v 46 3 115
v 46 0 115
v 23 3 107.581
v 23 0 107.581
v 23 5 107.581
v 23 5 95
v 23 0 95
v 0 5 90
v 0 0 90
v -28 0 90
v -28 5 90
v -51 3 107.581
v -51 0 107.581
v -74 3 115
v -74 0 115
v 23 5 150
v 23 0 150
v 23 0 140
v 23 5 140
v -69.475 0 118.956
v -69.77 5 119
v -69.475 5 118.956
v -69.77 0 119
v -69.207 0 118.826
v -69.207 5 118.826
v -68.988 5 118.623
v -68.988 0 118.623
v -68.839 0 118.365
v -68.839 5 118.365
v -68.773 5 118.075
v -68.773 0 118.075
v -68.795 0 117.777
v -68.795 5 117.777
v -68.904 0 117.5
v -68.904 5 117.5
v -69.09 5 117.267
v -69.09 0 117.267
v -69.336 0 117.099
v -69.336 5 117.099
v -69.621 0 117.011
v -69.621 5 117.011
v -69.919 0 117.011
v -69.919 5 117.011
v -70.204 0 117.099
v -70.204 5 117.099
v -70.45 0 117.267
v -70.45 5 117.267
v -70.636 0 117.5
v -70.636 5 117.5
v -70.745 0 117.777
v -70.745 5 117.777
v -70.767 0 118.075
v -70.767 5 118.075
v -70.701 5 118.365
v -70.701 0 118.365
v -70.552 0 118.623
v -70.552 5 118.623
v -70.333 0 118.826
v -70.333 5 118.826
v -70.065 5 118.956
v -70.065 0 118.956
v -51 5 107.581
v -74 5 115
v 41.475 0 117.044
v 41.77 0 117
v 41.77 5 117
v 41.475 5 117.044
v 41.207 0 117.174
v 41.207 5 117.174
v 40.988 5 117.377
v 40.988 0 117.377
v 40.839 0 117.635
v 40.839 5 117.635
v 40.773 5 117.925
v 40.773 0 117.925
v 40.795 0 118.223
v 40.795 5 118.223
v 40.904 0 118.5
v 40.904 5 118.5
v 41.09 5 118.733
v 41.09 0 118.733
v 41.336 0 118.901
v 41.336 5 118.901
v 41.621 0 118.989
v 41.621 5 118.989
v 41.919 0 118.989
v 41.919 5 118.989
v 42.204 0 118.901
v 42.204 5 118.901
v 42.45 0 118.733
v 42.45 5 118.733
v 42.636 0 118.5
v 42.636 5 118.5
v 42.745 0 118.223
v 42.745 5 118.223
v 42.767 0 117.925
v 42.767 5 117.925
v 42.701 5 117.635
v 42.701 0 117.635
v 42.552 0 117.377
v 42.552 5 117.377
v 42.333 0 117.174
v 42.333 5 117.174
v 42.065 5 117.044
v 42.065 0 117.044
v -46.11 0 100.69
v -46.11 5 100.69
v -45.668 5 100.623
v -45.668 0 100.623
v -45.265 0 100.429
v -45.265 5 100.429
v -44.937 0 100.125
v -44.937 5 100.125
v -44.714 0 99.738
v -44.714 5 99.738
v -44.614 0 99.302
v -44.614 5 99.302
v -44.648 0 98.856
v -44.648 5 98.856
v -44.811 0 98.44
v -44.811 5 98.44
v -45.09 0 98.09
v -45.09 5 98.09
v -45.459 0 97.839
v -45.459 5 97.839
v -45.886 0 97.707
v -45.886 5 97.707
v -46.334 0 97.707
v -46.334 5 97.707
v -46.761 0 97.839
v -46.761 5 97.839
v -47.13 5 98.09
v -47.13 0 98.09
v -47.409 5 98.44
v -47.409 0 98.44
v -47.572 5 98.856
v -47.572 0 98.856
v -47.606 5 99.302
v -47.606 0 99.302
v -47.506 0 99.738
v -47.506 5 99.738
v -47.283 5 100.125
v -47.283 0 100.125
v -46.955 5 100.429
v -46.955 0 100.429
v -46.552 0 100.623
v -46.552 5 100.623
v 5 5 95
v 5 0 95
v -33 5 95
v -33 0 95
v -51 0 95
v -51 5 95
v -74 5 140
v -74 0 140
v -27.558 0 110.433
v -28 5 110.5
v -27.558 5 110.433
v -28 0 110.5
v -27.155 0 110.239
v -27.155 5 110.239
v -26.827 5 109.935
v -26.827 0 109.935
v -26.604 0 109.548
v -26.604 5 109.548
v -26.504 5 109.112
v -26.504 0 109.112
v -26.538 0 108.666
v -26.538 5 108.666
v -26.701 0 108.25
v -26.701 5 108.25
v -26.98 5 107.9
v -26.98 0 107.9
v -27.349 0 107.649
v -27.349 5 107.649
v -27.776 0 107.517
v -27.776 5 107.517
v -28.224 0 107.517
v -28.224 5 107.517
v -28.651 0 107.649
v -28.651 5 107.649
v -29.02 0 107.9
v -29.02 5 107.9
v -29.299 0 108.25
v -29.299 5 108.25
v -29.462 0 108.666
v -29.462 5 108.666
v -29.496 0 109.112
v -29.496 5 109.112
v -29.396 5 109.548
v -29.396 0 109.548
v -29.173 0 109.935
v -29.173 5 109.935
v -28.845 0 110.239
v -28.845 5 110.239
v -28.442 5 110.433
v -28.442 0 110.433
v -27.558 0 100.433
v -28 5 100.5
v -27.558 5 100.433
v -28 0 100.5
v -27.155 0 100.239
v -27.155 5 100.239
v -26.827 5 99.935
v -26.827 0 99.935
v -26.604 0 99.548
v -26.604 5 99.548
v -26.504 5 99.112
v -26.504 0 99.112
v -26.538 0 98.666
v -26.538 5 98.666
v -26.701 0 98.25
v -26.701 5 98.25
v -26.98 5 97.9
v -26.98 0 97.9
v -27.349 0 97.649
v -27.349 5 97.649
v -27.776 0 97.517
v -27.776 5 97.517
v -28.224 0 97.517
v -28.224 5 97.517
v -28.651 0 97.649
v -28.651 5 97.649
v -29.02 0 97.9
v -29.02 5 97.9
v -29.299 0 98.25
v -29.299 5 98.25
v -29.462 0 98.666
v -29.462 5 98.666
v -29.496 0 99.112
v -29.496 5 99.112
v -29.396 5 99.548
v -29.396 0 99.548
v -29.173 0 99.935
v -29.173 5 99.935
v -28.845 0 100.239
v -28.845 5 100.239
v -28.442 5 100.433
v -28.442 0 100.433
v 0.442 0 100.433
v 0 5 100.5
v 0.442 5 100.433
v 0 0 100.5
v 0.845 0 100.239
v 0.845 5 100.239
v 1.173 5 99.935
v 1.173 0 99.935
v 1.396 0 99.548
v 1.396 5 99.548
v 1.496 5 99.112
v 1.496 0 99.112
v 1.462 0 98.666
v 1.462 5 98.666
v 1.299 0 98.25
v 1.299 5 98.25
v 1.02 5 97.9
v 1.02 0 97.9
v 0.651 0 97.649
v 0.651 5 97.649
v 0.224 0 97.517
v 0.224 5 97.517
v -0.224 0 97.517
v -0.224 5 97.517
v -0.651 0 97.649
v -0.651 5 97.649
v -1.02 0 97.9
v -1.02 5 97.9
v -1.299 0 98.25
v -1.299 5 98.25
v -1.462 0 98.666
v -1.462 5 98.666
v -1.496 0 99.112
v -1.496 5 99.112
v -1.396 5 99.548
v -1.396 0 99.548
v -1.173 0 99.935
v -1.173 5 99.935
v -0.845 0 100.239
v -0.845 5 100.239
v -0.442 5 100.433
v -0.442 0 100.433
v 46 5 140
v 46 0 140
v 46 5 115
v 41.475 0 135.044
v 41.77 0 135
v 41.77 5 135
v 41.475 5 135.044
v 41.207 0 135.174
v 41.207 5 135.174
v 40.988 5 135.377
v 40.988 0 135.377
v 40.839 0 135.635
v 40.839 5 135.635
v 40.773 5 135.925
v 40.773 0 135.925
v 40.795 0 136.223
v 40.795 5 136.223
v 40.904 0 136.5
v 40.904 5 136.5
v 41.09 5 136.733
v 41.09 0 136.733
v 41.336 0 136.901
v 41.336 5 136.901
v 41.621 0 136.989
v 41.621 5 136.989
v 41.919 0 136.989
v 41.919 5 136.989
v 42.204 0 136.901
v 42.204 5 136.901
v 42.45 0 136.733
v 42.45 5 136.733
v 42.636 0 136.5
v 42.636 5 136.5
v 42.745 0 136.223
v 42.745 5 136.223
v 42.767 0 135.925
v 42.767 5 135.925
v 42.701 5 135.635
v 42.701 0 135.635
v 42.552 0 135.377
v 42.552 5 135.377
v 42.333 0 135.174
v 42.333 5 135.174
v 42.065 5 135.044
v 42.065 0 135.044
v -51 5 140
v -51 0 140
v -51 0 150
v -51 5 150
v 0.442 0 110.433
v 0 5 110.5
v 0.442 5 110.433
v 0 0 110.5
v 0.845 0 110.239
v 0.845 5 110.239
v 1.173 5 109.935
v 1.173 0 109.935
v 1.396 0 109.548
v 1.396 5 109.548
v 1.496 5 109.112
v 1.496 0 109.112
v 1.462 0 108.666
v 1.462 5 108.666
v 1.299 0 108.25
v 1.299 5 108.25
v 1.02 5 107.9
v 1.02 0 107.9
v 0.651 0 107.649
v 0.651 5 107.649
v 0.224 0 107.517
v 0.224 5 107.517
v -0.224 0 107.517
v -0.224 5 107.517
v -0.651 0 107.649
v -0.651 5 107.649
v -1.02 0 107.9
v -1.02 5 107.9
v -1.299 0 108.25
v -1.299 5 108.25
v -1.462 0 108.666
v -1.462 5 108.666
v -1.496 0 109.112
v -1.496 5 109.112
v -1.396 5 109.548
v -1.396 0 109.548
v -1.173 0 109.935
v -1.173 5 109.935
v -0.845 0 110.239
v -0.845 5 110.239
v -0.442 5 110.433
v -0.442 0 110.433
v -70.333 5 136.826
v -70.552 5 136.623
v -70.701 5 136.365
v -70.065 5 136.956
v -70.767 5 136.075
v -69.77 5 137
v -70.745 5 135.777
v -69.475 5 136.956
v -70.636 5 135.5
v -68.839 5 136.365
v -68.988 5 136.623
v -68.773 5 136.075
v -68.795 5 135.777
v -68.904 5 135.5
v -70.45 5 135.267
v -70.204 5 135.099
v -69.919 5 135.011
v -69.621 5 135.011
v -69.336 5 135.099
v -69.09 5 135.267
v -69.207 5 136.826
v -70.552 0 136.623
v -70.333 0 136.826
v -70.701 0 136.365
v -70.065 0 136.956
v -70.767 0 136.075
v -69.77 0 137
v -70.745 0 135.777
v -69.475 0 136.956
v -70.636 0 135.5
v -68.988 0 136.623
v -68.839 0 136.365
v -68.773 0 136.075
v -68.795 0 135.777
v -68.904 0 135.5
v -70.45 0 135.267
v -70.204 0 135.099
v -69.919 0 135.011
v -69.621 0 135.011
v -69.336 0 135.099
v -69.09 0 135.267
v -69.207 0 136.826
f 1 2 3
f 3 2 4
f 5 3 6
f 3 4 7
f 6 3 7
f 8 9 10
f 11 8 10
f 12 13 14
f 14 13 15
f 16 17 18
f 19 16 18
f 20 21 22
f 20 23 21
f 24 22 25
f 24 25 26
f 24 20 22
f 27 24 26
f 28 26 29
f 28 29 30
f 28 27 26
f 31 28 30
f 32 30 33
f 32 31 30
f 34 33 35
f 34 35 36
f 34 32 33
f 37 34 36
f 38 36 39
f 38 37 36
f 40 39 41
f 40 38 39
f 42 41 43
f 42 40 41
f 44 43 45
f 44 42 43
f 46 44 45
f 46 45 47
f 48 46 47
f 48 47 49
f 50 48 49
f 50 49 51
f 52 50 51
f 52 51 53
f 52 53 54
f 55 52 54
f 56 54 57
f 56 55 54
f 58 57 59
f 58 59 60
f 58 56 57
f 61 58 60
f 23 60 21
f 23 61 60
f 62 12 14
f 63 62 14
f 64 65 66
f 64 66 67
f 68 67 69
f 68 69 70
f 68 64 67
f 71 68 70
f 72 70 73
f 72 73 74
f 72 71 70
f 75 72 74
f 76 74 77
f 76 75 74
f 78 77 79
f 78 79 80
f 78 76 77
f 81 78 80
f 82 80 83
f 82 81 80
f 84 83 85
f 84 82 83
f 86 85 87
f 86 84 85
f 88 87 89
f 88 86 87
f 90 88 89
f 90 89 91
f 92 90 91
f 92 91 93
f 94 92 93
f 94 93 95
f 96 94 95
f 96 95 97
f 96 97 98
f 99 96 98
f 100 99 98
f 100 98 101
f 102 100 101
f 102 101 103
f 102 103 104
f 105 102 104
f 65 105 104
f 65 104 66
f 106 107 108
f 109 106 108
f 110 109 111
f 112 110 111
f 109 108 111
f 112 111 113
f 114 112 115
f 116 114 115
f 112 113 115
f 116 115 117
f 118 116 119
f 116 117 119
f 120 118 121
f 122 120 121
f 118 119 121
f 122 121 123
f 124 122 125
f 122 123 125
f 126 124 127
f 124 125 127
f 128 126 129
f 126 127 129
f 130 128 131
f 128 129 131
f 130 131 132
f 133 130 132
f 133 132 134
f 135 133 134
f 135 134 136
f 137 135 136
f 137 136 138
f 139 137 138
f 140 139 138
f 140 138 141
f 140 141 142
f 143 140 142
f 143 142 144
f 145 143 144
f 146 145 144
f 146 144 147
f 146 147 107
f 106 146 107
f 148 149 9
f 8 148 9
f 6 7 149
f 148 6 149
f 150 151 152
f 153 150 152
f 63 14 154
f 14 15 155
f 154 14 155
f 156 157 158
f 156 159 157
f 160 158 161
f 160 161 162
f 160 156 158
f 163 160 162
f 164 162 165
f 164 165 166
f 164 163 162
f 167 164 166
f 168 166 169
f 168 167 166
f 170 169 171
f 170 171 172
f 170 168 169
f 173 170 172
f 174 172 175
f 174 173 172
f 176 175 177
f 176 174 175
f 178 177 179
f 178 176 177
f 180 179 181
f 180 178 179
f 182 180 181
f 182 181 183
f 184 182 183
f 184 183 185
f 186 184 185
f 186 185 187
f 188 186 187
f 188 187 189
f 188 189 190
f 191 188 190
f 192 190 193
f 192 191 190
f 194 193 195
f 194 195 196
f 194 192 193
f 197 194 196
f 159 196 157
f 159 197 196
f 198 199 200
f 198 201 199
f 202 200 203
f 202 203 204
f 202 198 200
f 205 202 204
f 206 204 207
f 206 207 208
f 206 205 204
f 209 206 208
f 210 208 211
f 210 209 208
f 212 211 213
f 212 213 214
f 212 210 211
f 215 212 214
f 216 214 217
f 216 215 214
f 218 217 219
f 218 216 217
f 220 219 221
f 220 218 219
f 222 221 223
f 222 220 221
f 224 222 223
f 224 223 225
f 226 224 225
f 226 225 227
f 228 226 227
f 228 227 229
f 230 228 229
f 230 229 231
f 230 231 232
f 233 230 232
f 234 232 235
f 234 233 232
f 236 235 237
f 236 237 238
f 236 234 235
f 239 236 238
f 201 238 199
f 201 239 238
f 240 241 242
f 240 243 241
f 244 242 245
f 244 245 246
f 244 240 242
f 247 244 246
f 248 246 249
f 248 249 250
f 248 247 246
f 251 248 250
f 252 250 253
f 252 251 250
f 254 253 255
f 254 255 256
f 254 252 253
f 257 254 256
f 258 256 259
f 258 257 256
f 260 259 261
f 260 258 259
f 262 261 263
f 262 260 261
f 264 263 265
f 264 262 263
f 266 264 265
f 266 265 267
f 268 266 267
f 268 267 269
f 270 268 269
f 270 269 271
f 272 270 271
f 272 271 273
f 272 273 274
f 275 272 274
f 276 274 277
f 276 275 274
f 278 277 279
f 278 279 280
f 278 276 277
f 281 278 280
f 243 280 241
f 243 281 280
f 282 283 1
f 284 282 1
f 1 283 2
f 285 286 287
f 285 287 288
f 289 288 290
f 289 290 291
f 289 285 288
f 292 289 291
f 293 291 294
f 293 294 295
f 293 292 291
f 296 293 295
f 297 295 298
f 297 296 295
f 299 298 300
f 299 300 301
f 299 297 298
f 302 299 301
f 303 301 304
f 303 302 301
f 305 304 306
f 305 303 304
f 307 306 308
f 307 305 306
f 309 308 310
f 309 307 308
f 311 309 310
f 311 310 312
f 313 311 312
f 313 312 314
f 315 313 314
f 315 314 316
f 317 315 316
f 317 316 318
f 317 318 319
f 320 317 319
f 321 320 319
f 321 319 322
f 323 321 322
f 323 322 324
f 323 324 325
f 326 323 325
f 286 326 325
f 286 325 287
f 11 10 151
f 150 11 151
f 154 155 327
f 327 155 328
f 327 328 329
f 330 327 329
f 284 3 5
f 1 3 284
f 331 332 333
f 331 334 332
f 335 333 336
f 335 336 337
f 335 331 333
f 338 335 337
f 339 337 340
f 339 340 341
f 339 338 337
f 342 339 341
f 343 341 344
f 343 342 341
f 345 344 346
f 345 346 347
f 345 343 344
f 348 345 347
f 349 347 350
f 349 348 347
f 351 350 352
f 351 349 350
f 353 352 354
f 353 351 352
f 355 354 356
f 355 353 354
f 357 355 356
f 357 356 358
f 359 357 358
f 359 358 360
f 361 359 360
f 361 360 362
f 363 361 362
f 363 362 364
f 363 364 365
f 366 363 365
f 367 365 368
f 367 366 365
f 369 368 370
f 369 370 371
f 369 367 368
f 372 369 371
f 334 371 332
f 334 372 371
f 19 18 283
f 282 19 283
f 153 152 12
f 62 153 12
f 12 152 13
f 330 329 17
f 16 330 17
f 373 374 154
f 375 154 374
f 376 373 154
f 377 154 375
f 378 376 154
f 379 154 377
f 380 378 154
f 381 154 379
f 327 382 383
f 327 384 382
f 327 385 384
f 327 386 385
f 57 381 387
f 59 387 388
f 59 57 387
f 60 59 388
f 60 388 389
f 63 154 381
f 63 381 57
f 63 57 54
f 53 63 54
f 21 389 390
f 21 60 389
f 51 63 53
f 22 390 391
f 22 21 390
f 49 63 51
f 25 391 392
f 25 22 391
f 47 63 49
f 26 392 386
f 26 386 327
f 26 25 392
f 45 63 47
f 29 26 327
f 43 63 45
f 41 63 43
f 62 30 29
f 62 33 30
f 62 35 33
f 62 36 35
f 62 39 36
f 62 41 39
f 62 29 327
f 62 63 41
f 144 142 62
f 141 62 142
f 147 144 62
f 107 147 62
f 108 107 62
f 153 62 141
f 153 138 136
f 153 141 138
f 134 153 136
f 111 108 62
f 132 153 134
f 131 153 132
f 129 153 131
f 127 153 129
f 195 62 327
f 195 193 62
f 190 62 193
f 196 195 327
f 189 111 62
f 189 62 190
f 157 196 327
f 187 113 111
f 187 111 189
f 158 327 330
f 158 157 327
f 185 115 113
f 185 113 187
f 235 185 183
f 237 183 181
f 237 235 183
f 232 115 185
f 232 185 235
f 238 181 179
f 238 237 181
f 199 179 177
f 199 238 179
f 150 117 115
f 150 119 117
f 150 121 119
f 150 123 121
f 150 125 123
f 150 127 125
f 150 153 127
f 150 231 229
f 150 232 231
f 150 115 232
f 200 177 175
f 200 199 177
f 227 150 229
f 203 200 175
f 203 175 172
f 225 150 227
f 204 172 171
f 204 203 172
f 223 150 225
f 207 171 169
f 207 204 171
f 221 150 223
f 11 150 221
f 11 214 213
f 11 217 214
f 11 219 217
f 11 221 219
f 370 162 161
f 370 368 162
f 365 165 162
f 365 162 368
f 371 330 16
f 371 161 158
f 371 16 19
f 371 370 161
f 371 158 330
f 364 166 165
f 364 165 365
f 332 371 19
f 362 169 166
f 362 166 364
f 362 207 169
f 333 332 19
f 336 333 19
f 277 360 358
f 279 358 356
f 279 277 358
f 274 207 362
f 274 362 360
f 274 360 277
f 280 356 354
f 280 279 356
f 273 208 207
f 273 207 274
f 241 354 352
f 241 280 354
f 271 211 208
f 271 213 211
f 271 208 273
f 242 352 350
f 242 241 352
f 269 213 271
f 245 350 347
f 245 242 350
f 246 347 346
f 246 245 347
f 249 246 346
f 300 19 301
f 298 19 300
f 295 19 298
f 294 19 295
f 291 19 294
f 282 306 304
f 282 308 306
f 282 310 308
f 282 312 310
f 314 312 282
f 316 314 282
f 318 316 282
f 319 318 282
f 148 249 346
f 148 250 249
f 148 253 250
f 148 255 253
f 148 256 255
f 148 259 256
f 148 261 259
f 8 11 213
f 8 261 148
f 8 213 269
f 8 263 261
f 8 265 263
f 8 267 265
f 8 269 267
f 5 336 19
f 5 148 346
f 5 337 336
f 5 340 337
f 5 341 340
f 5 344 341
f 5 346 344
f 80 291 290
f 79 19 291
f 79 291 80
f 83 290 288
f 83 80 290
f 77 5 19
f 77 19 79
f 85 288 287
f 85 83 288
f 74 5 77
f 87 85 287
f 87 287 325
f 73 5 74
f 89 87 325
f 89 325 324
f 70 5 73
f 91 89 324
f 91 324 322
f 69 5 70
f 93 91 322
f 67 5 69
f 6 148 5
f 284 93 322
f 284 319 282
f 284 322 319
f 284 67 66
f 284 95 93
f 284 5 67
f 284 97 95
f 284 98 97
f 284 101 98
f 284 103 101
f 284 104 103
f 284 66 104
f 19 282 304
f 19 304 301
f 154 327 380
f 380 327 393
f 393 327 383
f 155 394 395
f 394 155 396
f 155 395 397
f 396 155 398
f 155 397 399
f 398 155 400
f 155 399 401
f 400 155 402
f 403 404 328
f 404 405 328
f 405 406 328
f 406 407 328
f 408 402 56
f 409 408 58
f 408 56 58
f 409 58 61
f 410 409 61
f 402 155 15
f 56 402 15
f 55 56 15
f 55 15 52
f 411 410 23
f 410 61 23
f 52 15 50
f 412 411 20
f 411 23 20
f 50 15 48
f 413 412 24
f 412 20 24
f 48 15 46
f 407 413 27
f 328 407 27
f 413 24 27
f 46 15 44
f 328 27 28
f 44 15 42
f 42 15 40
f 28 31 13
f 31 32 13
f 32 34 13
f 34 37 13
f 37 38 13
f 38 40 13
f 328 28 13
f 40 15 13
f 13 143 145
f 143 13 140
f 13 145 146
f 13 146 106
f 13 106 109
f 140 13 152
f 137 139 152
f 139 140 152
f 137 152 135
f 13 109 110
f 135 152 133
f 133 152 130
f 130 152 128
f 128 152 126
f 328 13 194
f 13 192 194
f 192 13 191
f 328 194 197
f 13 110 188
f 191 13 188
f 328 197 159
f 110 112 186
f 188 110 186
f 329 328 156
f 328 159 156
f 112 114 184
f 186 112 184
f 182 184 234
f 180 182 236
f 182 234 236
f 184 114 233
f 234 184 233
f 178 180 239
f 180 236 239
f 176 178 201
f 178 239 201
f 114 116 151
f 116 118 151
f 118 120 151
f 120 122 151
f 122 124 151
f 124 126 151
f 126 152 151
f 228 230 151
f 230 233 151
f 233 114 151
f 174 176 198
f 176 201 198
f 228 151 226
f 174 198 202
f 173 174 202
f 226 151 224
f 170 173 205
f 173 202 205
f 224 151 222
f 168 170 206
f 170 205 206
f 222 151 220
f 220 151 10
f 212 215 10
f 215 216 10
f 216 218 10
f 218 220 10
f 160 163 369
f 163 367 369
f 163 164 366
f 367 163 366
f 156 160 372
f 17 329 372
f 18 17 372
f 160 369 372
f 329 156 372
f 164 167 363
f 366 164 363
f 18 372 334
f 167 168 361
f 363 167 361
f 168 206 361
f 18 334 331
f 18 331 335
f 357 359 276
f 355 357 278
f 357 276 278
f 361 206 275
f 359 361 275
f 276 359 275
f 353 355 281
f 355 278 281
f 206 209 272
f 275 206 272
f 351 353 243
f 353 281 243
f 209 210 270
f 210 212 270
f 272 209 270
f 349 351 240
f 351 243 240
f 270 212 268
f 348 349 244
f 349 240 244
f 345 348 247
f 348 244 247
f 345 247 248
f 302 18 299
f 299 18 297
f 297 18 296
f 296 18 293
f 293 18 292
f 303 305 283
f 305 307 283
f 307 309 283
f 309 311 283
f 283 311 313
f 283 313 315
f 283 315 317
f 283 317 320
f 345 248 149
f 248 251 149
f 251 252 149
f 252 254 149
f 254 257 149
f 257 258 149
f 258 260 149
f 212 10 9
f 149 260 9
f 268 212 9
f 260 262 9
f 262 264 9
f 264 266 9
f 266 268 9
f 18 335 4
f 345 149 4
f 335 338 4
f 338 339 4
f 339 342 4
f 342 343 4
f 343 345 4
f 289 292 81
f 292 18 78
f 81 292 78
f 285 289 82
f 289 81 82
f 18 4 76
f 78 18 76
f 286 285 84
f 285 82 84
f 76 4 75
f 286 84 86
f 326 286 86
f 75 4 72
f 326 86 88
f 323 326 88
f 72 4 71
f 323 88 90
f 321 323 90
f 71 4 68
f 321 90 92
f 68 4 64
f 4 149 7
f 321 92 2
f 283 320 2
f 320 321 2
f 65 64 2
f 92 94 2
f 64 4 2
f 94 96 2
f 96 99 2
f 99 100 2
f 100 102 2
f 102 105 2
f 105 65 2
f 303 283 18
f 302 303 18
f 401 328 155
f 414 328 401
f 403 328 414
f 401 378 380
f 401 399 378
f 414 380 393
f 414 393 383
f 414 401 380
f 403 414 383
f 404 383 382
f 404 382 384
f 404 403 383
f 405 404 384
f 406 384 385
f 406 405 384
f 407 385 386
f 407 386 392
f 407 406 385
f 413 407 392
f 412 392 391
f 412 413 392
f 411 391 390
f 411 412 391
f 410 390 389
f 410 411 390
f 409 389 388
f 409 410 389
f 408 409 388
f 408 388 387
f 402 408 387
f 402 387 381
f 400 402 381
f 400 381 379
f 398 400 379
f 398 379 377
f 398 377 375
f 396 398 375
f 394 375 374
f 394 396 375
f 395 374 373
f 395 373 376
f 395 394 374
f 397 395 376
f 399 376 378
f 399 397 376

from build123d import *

# Parameters (mm, degrees)
SKETCH1_R           = 1.5
SKETCH1_R_2         = 1
BOSS_EXTRUDE1_DEPTH = 3
SKETCH2_R           = 1
BOSS_EXTRUDE2_DEPTH = 2
BOSS_EXTRUDE4_START = -3
SKETCH3_R           = 1.5
BOSS_EXTRUDE4_DEPTH = 5
SKETCH4_R           = 1.5
CUT_EXTRUDE1_DEPTH  = 168.334993352


with BuildPart() as part:
    # Sketch1 → Boss-Extrude1 (new body)
    with BuildSketch(Plane(origin=(0, 0, 0), x_dir=(1, 0, 0), z_dir=(0, 1, 0))):
        Polygon((-28, -90), (-43, -105), (-74, -115), (-74, -140), (46, -140), (46, -115), (15, -105), (0, -90), align=None)
        with Locations(Location((-28, -99, 0), (0, 0, 270))):
            Circle(SKETCH1_R, mode=Mode.SUBTRACT)
        with Locations(Location((0, -99, 0), (0, 0, 270))):
            Circle(SKETCH1_R, mode=Mode.SUBTRACT)
        with Locations(Location((-28, -109, 0), (0, 0, 270))):
            Circle(SKETCH1_R, mode=Mode.SUBTRACT)
        with Locations(Location((0, -109, 0), (0, 0, 270))):
            Circle(SKETCH1_R, mode=Mode.SUBTRACT)
        with Locations(Location((-69.77, -136, 0), (0, 0, 270))):
            Circle(SKETCH1_R_2, mode=Mode.SUBTRACT)
        with Locations(Location((-69.77, -118, 0), (0, 0, 270))):
            Circle(SKETCH1_R_2, mode=Mode.SUBTRACT)
        with Locations(Location((41.77, -136, 0), (0, 0, 90))):
            Circle(SKETCH1_R_2, mode=Mode.SUBTRACT)
        with Locations(Location((41.77, -118, 0), (0, 0, 90))):
            Circle(SKETCH1_R_2, mode=Mode.SUBTRACT)
    extrude(amount=BOSS_EXTRUDE1_DEPTH)

    # Sketch2 → Boss-Extrude2 (add)
    # profile 1 of 2: a face of its own
    with BuildSketch(Plane(origin=(0, 3, 0), x_dir=(1, 0, 0), z_dir=(0, 1, 0))):
        Polygon((-74, -115), (-74, -140), (-51, -140), (-51, -107.580645161), align=None)
        with Locations(Location((-69.77, -118, 0), (0, 0, 270))):
            Circle(SKETCH2_R, mode=Mode.SUBTRACT)
        with Locations(Location((-69.77, -136, 0), (0, 0, 270))):
            Circle(SKETCH2_R, mode=Mode.SUBTRACT)
    # profile 2 of 2: a face of its own
    with BuildSketch(Plane(origin=(0, 3, 0), x_dir=(1, 0, 0), z_dir=(0, 1, 0))):
        Polygon((46, -115), (46, -140), (23, -140), (23, -107.580645161), align=None)
        with Locations(Location((41.77, -118, 0), (0, 0, 90))):
            Circle(SKETCH2_R, mode=Mode.SUBTRACT)
        with Locations(Location((41.77, -136, 0), (0, 0, 90))):
            Circle(SKETCH2_R, mode=Mode.SUBTRACT)
    extrude(amount=BOSS_EXTRUDE2_DEPTH)

    # Sketch3 → Boss-Extrude4 (add)
    with BuildSketch(Plane(origin=(0, 3, 0), x_dir=(1, 0, 0), z_dir=(0, 1, 0)).offset(BOSS_EXTRUDE4_START)):
        Polygon((-51, -150), (23, -150), (23, -95), (5, -95), (0, -90), (-28, -90), (-33, -95), (-51, -95), align=None)
        with Locations(Location((-28, -99, 0), (0, 0, 270))):
            Circle(SKETCH3_R, mode=Mode.SUBTRACT)
        with Locations(Location((0, -99, 0), (0, 0, 270))):
            Circle(SKETCH3_R, mode=Mode.SUBTRACT)
        with Locations(Location((0, -109, 0), (0, 0, 270))):
            Circle(SKETCH3_R, mode=Mode.SUBTRACT)
        with Locations(Location((-28, -109, 0), (0, 0, 270))):
            Circle(SKETCH3_R, mode=Mode.SUBTRACT)
    extrude(amount=BOSS_EXTRUDE4_DEPTH)

    # Sketch4 → Cut-Extrude1 (cut, through all)
    with BuildSketch(Plane(origin=(0, 5, 0), x_dir=(1, 0, 0), z_dir=(0, 1, 0))):
        with Locations(Location((-46.11, -99.19, 0), (0, 0, 270))):
            Circle(SKETCH4_R)
    extrude(amount=-CUT_EXTRUDE1_DEPTH, mode=Mode.SUBTRACT)


solid = part.part
